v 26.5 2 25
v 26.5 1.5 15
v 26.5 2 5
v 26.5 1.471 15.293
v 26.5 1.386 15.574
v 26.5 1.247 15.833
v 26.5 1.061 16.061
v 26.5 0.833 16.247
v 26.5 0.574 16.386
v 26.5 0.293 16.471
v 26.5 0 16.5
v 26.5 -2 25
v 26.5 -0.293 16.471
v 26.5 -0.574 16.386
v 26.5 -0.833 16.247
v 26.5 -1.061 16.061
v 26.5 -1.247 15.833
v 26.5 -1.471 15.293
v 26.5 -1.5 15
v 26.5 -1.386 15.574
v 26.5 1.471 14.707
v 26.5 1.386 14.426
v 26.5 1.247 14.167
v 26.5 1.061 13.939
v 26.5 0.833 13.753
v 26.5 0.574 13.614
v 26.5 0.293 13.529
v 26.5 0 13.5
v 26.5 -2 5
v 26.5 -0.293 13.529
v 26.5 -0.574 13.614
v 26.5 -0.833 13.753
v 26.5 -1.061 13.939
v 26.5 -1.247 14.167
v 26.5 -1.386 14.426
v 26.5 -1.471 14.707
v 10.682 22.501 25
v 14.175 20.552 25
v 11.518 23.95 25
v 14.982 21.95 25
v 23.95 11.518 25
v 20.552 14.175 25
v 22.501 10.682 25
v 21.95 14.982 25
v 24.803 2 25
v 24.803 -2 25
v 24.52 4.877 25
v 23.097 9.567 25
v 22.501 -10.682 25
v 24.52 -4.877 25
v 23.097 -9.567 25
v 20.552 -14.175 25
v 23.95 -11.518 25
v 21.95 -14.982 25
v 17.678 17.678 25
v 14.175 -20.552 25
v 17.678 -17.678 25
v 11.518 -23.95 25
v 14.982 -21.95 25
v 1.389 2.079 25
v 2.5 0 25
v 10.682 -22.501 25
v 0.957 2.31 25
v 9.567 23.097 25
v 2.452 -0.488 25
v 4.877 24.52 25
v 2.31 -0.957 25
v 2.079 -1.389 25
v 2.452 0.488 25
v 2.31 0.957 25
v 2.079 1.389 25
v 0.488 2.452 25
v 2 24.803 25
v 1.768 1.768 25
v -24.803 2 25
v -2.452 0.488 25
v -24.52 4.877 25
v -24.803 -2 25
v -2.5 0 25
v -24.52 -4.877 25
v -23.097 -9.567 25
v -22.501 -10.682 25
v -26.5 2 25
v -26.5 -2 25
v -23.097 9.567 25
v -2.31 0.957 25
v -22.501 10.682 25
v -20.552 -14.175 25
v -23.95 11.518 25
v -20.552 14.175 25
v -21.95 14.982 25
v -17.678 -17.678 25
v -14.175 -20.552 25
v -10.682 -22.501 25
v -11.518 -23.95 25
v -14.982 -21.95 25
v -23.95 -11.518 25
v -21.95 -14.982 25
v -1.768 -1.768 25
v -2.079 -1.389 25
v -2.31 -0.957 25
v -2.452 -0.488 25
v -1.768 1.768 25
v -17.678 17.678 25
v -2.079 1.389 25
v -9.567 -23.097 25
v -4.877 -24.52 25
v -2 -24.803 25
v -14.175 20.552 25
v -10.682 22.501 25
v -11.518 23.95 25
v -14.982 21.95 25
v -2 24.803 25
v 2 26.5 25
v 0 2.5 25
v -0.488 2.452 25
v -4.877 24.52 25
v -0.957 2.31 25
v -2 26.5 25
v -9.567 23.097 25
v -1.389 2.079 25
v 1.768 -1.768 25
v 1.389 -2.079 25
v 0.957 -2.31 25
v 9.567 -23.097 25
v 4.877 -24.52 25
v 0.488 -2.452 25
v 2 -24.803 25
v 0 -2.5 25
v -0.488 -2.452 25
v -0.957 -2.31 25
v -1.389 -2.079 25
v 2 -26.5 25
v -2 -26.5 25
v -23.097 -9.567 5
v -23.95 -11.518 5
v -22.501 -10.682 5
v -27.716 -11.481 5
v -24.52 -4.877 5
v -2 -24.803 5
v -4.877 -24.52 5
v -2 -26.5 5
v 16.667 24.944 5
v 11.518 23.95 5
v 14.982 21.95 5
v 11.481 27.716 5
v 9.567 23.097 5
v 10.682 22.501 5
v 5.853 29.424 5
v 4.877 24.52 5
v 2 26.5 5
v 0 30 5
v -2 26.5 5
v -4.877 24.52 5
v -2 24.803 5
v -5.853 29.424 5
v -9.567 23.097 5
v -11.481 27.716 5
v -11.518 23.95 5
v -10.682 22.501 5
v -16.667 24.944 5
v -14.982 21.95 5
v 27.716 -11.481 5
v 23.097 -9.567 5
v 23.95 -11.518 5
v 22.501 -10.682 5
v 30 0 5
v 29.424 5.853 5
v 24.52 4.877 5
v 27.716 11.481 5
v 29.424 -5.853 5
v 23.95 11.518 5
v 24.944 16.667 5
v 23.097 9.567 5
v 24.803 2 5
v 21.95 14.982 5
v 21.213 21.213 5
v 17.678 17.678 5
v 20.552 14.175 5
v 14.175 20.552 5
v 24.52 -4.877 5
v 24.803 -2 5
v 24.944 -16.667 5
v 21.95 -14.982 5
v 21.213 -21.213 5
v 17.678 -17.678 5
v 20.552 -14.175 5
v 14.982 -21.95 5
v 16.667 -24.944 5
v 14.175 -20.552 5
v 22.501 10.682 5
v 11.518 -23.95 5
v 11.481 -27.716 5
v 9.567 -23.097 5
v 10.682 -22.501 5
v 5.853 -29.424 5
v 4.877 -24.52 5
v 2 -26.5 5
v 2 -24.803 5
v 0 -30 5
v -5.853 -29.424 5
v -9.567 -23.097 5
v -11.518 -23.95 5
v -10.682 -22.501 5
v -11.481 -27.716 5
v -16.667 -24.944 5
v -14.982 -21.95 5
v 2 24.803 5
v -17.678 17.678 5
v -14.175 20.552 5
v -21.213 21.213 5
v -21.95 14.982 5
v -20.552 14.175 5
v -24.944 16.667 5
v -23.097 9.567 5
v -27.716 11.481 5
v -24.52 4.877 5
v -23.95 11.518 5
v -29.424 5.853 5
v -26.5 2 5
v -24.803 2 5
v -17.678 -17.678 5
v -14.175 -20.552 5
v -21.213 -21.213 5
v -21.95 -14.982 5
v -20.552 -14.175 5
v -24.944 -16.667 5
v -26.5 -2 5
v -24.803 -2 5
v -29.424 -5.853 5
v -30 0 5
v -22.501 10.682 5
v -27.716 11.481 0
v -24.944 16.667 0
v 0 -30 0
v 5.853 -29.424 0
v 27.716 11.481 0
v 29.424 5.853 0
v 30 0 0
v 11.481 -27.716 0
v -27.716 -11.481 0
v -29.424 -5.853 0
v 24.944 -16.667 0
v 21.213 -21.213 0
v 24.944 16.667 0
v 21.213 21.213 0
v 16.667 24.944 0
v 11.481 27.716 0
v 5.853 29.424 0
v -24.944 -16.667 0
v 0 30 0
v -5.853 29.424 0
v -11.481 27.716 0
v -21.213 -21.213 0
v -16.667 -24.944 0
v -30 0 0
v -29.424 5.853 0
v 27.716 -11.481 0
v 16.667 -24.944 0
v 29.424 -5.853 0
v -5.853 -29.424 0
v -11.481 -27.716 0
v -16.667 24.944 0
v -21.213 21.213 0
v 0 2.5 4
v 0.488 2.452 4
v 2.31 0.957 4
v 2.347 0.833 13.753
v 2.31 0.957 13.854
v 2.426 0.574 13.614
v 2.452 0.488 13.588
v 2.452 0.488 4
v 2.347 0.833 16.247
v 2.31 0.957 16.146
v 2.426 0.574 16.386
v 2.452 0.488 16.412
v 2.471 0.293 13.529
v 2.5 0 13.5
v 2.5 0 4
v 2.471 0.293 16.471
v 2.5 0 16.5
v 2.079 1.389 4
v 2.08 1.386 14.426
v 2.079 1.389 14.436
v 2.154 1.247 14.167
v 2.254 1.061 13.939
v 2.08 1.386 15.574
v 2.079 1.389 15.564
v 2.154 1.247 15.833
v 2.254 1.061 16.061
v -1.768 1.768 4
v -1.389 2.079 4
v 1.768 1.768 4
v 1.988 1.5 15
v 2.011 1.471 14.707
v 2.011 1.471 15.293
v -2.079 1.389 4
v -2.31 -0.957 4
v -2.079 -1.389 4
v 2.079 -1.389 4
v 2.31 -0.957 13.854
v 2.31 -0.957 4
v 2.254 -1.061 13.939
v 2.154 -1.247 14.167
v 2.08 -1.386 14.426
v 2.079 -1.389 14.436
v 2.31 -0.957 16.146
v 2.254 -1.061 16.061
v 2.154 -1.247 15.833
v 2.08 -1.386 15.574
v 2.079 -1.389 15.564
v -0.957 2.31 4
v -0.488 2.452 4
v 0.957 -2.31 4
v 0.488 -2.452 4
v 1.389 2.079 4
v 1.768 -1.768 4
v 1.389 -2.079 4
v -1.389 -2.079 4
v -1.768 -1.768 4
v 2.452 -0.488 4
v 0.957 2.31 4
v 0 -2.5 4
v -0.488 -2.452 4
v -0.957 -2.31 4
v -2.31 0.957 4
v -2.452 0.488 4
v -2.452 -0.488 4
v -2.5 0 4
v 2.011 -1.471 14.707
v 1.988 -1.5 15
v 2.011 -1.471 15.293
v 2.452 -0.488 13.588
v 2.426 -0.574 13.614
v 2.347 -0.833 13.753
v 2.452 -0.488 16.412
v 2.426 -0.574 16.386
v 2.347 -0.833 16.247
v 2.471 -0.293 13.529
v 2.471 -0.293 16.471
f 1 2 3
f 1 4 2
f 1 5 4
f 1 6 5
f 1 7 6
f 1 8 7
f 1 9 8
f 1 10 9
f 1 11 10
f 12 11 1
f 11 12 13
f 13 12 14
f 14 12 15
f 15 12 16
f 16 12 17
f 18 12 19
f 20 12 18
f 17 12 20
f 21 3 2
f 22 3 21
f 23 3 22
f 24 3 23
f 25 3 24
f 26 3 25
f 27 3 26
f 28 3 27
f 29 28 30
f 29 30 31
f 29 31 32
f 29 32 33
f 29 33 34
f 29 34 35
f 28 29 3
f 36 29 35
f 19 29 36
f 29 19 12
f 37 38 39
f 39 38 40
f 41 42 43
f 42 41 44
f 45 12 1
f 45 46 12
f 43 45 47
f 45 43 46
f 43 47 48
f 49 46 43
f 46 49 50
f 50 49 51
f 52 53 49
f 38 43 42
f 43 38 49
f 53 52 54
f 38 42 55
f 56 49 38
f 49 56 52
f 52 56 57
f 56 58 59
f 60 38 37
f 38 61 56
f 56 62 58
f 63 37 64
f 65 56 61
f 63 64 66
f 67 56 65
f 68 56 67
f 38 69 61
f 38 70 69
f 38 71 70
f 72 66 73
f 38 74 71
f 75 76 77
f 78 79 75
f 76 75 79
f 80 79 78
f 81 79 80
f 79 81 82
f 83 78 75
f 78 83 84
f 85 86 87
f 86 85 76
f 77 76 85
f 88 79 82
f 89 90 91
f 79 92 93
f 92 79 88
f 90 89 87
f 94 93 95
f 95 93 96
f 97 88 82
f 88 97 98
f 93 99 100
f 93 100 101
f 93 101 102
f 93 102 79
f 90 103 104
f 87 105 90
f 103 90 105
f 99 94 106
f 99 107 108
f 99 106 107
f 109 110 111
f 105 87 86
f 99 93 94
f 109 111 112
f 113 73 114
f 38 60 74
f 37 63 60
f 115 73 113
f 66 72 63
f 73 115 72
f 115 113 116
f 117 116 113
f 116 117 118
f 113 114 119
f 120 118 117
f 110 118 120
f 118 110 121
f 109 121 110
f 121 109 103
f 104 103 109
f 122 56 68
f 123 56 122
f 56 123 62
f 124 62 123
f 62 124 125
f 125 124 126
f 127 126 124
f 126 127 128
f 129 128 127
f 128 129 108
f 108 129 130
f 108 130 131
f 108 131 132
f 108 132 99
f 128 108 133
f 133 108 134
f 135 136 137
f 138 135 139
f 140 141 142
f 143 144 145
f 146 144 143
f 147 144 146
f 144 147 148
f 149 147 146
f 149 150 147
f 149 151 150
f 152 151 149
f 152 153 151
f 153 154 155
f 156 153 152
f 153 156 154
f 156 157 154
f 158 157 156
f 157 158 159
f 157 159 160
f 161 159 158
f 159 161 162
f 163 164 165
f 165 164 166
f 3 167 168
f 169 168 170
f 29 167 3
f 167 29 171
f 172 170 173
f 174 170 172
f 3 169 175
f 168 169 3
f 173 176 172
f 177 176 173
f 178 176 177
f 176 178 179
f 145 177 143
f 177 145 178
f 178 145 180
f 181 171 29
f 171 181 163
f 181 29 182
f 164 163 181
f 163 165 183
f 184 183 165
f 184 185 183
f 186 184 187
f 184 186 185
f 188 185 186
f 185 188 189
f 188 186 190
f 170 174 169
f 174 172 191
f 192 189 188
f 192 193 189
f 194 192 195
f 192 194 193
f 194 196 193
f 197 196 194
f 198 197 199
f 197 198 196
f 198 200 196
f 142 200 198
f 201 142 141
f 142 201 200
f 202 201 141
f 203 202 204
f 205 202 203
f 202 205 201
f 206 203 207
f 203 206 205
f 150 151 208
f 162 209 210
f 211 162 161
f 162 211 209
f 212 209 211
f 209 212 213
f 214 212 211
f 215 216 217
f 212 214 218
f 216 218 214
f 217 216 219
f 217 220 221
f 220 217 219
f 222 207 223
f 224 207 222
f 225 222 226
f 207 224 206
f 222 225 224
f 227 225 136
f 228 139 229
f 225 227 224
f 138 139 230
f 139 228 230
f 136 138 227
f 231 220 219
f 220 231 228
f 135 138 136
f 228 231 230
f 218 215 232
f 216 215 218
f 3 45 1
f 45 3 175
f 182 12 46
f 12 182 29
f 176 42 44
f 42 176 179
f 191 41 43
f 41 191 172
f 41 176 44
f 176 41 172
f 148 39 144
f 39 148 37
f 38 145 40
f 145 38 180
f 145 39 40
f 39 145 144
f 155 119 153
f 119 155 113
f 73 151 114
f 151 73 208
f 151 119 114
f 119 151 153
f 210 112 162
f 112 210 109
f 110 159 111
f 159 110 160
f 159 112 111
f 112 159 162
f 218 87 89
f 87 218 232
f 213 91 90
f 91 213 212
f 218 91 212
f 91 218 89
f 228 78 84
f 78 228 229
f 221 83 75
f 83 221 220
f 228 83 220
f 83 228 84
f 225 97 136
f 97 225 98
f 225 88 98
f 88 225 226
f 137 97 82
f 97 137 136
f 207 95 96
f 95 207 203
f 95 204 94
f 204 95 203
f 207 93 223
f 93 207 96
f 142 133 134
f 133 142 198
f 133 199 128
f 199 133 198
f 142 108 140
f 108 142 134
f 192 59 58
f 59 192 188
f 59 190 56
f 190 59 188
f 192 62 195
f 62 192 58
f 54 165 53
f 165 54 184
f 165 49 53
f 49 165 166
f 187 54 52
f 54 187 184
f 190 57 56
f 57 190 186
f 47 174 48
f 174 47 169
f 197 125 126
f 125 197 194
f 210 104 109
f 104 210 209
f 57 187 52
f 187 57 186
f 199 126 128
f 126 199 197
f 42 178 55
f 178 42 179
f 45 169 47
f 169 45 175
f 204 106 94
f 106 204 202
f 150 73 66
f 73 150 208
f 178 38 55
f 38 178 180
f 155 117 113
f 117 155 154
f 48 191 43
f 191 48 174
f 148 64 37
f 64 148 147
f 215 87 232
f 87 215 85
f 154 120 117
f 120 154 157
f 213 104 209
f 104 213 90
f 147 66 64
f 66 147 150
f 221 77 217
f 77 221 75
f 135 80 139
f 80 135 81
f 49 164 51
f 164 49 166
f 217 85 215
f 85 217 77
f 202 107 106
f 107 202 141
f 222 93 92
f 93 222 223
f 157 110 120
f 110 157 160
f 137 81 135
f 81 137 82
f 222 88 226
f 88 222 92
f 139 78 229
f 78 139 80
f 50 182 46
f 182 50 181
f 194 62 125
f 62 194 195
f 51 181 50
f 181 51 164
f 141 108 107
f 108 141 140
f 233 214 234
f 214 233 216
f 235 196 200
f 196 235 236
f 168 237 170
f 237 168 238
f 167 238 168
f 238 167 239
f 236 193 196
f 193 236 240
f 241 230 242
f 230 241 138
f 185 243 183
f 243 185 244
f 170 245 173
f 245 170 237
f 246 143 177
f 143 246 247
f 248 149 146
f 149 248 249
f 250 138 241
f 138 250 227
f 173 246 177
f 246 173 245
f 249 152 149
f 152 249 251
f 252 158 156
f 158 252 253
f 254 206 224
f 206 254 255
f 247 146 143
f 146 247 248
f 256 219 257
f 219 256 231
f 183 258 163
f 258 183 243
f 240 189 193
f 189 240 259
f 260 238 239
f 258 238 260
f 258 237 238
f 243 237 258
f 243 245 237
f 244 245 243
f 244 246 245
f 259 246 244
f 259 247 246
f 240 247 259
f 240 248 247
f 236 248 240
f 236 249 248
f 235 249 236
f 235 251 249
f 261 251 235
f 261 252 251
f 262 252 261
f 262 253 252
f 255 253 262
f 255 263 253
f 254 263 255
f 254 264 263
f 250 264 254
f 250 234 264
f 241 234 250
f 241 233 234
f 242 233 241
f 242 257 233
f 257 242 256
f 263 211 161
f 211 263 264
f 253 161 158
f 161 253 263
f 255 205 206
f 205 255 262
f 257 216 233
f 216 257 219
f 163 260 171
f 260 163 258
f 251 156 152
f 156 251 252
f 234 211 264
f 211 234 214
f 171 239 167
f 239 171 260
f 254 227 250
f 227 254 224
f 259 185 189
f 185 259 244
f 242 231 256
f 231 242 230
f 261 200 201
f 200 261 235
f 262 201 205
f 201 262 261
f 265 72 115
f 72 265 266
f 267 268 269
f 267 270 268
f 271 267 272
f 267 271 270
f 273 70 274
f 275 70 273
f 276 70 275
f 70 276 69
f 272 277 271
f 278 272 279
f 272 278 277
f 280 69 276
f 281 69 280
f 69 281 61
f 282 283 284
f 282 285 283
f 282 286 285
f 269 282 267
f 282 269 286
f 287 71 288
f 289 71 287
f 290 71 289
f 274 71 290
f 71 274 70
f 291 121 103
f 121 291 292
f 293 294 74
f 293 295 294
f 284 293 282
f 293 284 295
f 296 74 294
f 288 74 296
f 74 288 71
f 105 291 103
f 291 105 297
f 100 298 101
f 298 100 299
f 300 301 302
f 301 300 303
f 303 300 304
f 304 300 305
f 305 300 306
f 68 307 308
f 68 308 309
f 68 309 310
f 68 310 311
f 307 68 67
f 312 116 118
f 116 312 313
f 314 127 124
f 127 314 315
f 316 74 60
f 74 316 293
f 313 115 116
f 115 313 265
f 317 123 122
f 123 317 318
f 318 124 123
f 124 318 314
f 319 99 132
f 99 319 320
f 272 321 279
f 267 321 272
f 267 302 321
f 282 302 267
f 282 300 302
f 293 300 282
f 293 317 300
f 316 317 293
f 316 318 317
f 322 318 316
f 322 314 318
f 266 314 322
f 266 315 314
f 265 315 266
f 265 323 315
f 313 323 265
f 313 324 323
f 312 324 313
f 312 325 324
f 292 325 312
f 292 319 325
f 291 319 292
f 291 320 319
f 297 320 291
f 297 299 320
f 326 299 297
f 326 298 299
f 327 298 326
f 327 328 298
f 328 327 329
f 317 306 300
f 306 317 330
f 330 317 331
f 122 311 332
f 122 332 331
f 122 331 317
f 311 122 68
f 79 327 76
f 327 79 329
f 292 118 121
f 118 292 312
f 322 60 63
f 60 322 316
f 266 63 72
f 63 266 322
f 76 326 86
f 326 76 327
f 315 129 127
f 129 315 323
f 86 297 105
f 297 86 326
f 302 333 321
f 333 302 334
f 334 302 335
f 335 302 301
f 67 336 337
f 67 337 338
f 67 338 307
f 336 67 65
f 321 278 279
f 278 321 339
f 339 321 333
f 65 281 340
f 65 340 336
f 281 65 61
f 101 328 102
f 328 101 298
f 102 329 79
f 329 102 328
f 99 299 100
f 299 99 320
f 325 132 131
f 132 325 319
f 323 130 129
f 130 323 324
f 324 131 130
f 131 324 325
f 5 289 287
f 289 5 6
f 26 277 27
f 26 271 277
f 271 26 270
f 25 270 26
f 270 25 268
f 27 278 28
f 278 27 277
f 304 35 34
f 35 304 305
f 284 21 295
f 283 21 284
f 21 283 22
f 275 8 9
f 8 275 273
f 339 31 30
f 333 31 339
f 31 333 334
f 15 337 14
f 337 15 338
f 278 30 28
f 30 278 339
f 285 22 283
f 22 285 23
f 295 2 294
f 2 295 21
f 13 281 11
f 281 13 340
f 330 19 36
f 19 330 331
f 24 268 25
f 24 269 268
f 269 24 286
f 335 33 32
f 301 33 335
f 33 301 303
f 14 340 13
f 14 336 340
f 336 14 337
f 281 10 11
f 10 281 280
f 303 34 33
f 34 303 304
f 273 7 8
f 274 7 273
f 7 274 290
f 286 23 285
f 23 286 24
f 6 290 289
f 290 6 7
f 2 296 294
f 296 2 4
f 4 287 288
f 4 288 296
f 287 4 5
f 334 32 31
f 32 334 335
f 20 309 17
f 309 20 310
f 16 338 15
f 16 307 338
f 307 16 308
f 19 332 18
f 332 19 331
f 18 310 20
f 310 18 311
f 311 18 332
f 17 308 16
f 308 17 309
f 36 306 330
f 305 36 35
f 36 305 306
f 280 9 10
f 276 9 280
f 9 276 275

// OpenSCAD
$fn = 32;

// ----------------------------------------------------------------------
// Control knob: skirt knob with grip ribs
// ----------------------------------------------------------------------

// --- parameters (mm) ---
skirt_d = 60;             // skirt diameter
skirt_t = 5;              // skirt thickness
rib_w = 4;                // grip rib width
rib_out = 2.5;            // grip rib radial protrusion
n_ribs = 12;              // number of grip ribs
knob_d = 50;              // knob body diameter
knob_h = 20;              // knob body height
bore_d = 5;               // shaft bore diameter
set_d = 3;                // set screw bore diameter

rib_step = 360 / n_ribs;  // rib angular step
total_h = skirt_t + knob_h;  // overall height

difference() {
  union() {
    translate([0, 0, skirt_t]) cylinder(h = knob_h, d = knob_d);
    cylinder(h = skirt_t, d = skirt_d);
    for (i = [0 : n_ribs - 1])
      rotate([0, 0, i * rib_step])
        translate([knob_d / 2 - 1, -rib_w / 2, skirt_t])
          cube([rib_out, rib_w, knob_h]);
  }
  translate([0, 0, skirt_t - 1]) cylinder(h = knob_h + 2, d = bore_d);
  translate([-1, 0, skirt_t + knob_h / 2]) rotate([0, 90, 0])
    cylinder(h = knob_d / 2 + bore_d / 2 + 2, d = set_d);
}
